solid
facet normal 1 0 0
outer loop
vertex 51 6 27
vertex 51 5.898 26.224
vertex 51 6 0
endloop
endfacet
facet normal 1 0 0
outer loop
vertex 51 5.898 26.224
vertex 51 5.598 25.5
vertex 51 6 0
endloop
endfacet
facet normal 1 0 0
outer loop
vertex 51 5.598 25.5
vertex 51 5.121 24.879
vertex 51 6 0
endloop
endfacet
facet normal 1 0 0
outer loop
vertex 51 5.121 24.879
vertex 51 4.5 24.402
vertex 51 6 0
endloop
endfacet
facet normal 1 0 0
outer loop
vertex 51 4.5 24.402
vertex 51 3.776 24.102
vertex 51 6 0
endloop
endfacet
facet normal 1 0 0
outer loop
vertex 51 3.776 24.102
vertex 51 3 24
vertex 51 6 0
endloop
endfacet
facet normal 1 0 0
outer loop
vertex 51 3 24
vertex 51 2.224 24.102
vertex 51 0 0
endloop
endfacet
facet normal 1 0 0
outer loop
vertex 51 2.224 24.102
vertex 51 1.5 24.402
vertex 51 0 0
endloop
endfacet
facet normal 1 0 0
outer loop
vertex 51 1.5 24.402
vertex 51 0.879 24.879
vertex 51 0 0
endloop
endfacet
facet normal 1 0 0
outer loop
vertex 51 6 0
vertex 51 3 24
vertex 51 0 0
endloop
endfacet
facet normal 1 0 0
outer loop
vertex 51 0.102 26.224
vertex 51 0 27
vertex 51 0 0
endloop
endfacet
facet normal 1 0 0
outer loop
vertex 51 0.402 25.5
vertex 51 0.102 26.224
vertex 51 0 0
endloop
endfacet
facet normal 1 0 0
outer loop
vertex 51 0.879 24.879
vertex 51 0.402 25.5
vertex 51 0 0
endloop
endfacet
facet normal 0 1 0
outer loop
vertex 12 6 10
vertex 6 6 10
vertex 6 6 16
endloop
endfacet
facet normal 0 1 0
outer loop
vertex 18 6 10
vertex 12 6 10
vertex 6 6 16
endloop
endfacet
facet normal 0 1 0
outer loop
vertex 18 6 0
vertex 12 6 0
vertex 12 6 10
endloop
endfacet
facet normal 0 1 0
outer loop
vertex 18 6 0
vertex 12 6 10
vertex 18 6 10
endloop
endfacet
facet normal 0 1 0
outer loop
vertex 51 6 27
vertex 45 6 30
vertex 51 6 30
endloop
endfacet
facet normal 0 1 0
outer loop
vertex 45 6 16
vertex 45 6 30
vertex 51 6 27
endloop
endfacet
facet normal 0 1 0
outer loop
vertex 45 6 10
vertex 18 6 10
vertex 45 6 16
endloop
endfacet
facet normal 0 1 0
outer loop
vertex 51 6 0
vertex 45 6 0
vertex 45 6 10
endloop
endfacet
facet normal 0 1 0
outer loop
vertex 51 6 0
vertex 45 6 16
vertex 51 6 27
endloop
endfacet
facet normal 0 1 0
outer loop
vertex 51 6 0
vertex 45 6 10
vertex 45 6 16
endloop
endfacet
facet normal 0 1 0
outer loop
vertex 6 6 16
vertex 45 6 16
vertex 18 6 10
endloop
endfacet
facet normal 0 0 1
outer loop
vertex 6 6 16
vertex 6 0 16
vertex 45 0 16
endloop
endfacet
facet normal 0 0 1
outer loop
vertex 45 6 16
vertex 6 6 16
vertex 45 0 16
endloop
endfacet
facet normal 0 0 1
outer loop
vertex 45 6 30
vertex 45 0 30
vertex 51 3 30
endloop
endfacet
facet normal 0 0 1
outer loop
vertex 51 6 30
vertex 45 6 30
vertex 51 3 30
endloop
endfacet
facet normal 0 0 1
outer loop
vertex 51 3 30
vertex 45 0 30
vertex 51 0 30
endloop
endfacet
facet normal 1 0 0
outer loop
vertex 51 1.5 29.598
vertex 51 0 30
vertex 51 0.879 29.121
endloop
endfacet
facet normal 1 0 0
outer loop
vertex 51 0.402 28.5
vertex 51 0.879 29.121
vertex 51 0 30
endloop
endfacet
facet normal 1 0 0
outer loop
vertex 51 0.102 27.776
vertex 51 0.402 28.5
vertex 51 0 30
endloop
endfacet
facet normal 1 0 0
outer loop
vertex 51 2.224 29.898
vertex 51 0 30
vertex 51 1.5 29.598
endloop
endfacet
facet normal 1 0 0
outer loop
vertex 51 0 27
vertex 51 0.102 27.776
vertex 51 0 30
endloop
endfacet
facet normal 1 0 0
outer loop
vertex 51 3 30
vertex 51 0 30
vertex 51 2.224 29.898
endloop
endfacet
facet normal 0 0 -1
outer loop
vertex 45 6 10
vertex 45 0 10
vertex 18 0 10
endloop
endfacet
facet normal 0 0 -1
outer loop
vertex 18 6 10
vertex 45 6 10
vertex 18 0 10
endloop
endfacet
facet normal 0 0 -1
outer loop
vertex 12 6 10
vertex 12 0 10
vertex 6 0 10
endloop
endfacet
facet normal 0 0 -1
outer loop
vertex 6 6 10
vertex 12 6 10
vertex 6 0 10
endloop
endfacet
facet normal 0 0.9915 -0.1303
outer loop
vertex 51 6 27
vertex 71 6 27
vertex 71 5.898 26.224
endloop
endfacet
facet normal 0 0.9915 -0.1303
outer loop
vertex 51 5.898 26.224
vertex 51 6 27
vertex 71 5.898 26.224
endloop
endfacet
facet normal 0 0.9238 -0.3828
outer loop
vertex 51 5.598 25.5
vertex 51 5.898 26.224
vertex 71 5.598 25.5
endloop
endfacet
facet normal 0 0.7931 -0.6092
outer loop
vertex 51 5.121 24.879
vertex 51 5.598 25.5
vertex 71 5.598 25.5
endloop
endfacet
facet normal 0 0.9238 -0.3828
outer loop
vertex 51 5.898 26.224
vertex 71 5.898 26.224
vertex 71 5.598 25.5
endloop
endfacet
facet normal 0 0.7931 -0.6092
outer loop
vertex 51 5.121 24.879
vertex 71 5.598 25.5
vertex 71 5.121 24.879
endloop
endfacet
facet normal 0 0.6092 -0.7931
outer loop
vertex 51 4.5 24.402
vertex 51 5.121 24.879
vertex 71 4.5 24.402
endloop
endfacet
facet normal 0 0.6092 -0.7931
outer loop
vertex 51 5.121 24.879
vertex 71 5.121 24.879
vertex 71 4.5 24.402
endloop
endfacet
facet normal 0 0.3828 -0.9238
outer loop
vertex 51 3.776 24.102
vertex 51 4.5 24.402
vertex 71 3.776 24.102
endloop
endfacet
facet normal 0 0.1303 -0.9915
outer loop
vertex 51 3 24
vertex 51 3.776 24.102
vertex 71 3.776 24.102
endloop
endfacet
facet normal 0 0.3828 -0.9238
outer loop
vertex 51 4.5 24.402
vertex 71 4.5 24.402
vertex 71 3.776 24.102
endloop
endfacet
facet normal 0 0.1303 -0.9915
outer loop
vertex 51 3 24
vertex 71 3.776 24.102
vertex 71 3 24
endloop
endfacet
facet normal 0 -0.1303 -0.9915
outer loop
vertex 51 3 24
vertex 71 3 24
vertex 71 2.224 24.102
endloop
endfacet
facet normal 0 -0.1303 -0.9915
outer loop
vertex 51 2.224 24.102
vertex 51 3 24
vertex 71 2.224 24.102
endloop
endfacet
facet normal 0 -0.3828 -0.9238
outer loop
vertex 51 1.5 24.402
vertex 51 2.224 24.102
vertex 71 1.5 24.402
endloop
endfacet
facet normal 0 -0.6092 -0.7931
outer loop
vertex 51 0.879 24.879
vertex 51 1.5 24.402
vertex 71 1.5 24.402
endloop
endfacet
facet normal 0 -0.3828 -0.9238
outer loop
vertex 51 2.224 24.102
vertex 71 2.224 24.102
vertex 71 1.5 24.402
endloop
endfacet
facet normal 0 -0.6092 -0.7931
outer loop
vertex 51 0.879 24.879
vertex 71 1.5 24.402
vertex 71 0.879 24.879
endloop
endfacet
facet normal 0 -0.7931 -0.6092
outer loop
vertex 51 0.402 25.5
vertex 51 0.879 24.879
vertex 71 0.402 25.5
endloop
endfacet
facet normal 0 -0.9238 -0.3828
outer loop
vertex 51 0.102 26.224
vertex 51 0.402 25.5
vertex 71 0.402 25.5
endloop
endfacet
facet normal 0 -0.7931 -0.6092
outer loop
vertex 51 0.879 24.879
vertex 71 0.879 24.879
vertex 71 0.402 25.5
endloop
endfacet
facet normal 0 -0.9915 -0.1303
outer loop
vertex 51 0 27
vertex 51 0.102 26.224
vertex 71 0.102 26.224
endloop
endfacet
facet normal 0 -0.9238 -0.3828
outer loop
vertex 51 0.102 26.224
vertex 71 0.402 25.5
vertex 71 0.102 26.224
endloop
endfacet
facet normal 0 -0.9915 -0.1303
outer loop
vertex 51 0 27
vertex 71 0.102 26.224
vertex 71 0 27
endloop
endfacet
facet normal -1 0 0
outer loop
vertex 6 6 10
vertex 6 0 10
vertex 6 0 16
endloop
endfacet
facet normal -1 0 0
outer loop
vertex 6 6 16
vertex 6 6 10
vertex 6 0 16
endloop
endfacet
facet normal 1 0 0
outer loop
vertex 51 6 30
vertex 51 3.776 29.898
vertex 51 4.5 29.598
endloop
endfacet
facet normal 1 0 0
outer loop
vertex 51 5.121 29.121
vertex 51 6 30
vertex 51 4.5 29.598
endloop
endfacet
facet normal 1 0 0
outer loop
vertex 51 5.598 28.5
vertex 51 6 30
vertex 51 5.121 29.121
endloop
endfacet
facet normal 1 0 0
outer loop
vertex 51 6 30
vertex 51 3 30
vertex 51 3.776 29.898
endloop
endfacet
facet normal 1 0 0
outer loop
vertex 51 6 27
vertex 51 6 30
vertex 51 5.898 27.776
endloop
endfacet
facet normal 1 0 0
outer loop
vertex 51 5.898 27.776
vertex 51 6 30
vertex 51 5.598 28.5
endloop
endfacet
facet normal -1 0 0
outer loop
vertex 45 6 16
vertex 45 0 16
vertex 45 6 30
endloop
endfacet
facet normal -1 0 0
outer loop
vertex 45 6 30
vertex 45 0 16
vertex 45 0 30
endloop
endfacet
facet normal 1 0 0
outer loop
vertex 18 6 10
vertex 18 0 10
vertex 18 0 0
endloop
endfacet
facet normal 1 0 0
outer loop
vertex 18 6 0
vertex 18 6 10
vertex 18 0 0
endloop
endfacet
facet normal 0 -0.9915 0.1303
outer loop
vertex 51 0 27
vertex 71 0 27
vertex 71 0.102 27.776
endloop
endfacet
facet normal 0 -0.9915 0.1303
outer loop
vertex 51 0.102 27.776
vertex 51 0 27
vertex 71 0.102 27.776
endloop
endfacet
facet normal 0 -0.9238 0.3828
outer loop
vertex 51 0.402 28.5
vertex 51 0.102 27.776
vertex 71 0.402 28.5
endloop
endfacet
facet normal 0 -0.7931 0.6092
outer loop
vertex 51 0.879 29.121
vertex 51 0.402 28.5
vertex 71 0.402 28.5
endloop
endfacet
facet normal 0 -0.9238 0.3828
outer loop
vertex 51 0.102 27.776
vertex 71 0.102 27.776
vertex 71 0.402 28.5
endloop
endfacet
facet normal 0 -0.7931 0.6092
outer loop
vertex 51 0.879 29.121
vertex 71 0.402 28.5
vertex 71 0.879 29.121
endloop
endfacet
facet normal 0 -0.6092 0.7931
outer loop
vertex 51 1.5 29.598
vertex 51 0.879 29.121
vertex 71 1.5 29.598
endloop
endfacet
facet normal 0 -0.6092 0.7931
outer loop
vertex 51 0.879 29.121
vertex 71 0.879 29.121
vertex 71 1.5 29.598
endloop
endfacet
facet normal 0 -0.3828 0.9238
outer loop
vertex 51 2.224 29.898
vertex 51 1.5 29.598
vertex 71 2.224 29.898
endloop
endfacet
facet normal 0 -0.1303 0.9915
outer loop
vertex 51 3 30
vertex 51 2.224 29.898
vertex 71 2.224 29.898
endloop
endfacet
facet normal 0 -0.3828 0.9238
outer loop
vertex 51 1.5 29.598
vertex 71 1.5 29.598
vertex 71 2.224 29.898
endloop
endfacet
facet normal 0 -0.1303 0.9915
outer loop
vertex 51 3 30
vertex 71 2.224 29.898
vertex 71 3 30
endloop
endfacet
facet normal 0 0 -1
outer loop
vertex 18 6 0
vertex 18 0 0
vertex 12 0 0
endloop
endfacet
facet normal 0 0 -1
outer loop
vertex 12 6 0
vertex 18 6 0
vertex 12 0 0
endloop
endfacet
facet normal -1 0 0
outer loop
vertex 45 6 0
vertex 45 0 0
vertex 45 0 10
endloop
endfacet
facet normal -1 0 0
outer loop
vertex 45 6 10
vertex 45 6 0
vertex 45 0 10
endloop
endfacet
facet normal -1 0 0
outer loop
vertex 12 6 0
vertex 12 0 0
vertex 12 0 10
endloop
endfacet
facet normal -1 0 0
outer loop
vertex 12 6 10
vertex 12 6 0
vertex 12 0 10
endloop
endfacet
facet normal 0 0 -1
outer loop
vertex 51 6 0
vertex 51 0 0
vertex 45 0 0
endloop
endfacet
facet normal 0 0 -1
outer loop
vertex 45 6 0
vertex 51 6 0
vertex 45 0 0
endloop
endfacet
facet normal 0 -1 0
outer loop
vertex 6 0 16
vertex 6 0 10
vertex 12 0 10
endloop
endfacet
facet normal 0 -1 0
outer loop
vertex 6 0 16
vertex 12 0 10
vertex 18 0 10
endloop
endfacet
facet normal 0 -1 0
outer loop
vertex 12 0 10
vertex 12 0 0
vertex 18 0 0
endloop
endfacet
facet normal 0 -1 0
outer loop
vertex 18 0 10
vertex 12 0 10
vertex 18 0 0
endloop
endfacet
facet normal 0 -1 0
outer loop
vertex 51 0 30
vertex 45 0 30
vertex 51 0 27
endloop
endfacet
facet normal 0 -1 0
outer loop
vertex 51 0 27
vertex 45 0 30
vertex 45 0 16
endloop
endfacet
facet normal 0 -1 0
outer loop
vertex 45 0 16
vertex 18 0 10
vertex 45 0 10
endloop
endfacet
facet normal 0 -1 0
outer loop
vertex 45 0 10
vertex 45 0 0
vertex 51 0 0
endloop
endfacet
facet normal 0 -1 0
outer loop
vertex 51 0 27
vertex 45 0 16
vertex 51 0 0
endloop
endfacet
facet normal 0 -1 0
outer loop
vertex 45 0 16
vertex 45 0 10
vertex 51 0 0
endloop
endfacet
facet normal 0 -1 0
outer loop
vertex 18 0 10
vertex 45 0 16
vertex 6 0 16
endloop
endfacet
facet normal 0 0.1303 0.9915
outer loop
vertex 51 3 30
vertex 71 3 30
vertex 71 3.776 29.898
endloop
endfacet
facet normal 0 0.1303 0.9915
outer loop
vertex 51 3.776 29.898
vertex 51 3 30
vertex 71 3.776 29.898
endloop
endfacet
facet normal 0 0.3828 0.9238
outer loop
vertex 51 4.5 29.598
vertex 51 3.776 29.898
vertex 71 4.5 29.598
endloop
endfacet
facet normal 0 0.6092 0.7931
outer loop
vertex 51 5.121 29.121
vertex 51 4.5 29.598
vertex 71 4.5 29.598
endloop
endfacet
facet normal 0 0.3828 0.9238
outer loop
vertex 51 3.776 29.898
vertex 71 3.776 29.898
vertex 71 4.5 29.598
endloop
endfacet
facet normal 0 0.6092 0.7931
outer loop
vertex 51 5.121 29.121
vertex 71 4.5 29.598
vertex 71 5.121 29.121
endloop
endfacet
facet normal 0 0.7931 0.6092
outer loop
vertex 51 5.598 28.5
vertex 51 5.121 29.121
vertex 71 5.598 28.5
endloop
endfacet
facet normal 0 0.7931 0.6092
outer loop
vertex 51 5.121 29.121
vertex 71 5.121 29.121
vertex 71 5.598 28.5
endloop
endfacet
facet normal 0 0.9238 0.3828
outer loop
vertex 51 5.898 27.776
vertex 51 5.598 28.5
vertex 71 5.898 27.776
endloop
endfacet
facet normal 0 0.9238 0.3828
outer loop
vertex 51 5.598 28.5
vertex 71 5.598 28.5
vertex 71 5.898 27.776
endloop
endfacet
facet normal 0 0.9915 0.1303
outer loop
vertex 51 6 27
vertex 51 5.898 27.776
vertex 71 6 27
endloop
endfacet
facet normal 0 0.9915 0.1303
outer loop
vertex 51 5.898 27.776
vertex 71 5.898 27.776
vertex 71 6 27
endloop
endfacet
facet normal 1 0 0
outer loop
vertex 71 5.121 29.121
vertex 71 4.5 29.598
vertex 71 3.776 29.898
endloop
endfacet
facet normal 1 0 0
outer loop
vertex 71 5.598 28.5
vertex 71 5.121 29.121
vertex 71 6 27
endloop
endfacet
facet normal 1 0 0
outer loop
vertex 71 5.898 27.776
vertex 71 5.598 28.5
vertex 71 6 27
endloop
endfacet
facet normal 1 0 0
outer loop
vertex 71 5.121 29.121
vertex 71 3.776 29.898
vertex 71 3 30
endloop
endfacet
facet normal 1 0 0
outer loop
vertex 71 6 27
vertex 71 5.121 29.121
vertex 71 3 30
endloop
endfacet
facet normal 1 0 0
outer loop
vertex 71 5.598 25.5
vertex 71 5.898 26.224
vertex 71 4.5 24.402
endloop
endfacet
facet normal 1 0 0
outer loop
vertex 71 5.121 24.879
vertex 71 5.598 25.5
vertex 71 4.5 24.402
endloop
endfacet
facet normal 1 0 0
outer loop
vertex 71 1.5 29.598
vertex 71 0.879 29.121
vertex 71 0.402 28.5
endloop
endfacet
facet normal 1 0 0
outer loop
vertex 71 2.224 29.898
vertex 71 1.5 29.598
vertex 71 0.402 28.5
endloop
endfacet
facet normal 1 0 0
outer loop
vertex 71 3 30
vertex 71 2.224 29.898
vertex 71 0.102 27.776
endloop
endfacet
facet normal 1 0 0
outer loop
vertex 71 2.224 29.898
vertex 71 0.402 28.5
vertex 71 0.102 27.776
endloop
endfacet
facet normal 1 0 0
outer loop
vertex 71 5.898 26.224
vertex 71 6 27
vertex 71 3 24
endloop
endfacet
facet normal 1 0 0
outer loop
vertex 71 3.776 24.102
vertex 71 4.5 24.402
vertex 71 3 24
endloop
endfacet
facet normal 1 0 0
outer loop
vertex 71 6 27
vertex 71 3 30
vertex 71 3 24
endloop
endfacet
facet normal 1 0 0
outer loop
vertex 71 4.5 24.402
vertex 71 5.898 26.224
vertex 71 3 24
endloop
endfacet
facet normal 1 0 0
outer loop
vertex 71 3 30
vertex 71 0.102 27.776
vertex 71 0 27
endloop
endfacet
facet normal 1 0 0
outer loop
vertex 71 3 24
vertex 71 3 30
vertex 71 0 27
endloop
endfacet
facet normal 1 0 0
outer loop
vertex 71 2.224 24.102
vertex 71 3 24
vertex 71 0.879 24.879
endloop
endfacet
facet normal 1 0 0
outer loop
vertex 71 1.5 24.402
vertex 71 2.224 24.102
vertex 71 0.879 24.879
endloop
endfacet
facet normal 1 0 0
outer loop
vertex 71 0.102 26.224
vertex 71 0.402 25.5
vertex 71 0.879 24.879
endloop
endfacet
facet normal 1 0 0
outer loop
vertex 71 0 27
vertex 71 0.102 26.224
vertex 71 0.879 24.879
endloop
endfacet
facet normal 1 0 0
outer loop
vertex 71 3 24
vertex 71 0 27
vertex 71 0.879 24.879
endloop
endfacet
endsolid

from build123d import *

# Parameters (mm, degrees)
RESSALTO_EXTRUS_O3_DEPTH = 6
CORTE_EXTRUS_O1_DEPTH    = 20


with BuildPart() as part:
    # Esboço1 → Ressalto-extrusão3 (new body)
    with BuildSketch(Plane(origin=(0, 0, 0), x_dir=(1, 0, 0), z_dir=(0, 1, 0))):
        Polygon((12, -10), (6, -10), (6, -16), (45, -16), (45, -30), (71, -30), (71, -24), (51, -24), (51, 0), (45, 0), (45, -10), (18, -10), (18, 0), (12, 0), align=None)
    extrude(amount=RESSALTO_EXTRUS_O3_DEPTH)

    # Esboço2 → Corte-extrusão1 (cut)
    with BuildSketch(Plane(origin=(71, 0, 0), x_dir=(0, 0, -1), z_dir=(1, 0, 0))):
        with BuildLine():
            Line((-30, 6), (-30, 3))
            ThreePointArc((-30, 3), (-29.121320344, 5.121320344), (-27, 6))
            Line((-27, 6), (-30, 6))
        make_face()
        with BuildLine():
            Line((-24, 6), (-27, 6))
            ThreePointArc((-27, 6), (-24.878679656, 5.121320344), (-24, 3))
            Line((-24, 3), (-24, 6))
        make_face()
        with BuildLine():
            ThreePointArc((-24, 3), (-24.878679656, 0.878679656), (-27, 0))
            Line((-27, 0), (-24, 0))
            Line((-24, 0), (-24, 3))
        make_face()
        with BuildLine():
            ThreePointArc((-27, 0), (-29.121320344, 0.878679656), (-30, 3))
            Line((-30, 3), (-30, 0))
            Line((-30, 0), (-27, 0))
        make_face()
    extrude(amount=-CORTE_EXTRUS_O1_DEPTH, mode=Mode.SUBTRACT)


solid = part.part
